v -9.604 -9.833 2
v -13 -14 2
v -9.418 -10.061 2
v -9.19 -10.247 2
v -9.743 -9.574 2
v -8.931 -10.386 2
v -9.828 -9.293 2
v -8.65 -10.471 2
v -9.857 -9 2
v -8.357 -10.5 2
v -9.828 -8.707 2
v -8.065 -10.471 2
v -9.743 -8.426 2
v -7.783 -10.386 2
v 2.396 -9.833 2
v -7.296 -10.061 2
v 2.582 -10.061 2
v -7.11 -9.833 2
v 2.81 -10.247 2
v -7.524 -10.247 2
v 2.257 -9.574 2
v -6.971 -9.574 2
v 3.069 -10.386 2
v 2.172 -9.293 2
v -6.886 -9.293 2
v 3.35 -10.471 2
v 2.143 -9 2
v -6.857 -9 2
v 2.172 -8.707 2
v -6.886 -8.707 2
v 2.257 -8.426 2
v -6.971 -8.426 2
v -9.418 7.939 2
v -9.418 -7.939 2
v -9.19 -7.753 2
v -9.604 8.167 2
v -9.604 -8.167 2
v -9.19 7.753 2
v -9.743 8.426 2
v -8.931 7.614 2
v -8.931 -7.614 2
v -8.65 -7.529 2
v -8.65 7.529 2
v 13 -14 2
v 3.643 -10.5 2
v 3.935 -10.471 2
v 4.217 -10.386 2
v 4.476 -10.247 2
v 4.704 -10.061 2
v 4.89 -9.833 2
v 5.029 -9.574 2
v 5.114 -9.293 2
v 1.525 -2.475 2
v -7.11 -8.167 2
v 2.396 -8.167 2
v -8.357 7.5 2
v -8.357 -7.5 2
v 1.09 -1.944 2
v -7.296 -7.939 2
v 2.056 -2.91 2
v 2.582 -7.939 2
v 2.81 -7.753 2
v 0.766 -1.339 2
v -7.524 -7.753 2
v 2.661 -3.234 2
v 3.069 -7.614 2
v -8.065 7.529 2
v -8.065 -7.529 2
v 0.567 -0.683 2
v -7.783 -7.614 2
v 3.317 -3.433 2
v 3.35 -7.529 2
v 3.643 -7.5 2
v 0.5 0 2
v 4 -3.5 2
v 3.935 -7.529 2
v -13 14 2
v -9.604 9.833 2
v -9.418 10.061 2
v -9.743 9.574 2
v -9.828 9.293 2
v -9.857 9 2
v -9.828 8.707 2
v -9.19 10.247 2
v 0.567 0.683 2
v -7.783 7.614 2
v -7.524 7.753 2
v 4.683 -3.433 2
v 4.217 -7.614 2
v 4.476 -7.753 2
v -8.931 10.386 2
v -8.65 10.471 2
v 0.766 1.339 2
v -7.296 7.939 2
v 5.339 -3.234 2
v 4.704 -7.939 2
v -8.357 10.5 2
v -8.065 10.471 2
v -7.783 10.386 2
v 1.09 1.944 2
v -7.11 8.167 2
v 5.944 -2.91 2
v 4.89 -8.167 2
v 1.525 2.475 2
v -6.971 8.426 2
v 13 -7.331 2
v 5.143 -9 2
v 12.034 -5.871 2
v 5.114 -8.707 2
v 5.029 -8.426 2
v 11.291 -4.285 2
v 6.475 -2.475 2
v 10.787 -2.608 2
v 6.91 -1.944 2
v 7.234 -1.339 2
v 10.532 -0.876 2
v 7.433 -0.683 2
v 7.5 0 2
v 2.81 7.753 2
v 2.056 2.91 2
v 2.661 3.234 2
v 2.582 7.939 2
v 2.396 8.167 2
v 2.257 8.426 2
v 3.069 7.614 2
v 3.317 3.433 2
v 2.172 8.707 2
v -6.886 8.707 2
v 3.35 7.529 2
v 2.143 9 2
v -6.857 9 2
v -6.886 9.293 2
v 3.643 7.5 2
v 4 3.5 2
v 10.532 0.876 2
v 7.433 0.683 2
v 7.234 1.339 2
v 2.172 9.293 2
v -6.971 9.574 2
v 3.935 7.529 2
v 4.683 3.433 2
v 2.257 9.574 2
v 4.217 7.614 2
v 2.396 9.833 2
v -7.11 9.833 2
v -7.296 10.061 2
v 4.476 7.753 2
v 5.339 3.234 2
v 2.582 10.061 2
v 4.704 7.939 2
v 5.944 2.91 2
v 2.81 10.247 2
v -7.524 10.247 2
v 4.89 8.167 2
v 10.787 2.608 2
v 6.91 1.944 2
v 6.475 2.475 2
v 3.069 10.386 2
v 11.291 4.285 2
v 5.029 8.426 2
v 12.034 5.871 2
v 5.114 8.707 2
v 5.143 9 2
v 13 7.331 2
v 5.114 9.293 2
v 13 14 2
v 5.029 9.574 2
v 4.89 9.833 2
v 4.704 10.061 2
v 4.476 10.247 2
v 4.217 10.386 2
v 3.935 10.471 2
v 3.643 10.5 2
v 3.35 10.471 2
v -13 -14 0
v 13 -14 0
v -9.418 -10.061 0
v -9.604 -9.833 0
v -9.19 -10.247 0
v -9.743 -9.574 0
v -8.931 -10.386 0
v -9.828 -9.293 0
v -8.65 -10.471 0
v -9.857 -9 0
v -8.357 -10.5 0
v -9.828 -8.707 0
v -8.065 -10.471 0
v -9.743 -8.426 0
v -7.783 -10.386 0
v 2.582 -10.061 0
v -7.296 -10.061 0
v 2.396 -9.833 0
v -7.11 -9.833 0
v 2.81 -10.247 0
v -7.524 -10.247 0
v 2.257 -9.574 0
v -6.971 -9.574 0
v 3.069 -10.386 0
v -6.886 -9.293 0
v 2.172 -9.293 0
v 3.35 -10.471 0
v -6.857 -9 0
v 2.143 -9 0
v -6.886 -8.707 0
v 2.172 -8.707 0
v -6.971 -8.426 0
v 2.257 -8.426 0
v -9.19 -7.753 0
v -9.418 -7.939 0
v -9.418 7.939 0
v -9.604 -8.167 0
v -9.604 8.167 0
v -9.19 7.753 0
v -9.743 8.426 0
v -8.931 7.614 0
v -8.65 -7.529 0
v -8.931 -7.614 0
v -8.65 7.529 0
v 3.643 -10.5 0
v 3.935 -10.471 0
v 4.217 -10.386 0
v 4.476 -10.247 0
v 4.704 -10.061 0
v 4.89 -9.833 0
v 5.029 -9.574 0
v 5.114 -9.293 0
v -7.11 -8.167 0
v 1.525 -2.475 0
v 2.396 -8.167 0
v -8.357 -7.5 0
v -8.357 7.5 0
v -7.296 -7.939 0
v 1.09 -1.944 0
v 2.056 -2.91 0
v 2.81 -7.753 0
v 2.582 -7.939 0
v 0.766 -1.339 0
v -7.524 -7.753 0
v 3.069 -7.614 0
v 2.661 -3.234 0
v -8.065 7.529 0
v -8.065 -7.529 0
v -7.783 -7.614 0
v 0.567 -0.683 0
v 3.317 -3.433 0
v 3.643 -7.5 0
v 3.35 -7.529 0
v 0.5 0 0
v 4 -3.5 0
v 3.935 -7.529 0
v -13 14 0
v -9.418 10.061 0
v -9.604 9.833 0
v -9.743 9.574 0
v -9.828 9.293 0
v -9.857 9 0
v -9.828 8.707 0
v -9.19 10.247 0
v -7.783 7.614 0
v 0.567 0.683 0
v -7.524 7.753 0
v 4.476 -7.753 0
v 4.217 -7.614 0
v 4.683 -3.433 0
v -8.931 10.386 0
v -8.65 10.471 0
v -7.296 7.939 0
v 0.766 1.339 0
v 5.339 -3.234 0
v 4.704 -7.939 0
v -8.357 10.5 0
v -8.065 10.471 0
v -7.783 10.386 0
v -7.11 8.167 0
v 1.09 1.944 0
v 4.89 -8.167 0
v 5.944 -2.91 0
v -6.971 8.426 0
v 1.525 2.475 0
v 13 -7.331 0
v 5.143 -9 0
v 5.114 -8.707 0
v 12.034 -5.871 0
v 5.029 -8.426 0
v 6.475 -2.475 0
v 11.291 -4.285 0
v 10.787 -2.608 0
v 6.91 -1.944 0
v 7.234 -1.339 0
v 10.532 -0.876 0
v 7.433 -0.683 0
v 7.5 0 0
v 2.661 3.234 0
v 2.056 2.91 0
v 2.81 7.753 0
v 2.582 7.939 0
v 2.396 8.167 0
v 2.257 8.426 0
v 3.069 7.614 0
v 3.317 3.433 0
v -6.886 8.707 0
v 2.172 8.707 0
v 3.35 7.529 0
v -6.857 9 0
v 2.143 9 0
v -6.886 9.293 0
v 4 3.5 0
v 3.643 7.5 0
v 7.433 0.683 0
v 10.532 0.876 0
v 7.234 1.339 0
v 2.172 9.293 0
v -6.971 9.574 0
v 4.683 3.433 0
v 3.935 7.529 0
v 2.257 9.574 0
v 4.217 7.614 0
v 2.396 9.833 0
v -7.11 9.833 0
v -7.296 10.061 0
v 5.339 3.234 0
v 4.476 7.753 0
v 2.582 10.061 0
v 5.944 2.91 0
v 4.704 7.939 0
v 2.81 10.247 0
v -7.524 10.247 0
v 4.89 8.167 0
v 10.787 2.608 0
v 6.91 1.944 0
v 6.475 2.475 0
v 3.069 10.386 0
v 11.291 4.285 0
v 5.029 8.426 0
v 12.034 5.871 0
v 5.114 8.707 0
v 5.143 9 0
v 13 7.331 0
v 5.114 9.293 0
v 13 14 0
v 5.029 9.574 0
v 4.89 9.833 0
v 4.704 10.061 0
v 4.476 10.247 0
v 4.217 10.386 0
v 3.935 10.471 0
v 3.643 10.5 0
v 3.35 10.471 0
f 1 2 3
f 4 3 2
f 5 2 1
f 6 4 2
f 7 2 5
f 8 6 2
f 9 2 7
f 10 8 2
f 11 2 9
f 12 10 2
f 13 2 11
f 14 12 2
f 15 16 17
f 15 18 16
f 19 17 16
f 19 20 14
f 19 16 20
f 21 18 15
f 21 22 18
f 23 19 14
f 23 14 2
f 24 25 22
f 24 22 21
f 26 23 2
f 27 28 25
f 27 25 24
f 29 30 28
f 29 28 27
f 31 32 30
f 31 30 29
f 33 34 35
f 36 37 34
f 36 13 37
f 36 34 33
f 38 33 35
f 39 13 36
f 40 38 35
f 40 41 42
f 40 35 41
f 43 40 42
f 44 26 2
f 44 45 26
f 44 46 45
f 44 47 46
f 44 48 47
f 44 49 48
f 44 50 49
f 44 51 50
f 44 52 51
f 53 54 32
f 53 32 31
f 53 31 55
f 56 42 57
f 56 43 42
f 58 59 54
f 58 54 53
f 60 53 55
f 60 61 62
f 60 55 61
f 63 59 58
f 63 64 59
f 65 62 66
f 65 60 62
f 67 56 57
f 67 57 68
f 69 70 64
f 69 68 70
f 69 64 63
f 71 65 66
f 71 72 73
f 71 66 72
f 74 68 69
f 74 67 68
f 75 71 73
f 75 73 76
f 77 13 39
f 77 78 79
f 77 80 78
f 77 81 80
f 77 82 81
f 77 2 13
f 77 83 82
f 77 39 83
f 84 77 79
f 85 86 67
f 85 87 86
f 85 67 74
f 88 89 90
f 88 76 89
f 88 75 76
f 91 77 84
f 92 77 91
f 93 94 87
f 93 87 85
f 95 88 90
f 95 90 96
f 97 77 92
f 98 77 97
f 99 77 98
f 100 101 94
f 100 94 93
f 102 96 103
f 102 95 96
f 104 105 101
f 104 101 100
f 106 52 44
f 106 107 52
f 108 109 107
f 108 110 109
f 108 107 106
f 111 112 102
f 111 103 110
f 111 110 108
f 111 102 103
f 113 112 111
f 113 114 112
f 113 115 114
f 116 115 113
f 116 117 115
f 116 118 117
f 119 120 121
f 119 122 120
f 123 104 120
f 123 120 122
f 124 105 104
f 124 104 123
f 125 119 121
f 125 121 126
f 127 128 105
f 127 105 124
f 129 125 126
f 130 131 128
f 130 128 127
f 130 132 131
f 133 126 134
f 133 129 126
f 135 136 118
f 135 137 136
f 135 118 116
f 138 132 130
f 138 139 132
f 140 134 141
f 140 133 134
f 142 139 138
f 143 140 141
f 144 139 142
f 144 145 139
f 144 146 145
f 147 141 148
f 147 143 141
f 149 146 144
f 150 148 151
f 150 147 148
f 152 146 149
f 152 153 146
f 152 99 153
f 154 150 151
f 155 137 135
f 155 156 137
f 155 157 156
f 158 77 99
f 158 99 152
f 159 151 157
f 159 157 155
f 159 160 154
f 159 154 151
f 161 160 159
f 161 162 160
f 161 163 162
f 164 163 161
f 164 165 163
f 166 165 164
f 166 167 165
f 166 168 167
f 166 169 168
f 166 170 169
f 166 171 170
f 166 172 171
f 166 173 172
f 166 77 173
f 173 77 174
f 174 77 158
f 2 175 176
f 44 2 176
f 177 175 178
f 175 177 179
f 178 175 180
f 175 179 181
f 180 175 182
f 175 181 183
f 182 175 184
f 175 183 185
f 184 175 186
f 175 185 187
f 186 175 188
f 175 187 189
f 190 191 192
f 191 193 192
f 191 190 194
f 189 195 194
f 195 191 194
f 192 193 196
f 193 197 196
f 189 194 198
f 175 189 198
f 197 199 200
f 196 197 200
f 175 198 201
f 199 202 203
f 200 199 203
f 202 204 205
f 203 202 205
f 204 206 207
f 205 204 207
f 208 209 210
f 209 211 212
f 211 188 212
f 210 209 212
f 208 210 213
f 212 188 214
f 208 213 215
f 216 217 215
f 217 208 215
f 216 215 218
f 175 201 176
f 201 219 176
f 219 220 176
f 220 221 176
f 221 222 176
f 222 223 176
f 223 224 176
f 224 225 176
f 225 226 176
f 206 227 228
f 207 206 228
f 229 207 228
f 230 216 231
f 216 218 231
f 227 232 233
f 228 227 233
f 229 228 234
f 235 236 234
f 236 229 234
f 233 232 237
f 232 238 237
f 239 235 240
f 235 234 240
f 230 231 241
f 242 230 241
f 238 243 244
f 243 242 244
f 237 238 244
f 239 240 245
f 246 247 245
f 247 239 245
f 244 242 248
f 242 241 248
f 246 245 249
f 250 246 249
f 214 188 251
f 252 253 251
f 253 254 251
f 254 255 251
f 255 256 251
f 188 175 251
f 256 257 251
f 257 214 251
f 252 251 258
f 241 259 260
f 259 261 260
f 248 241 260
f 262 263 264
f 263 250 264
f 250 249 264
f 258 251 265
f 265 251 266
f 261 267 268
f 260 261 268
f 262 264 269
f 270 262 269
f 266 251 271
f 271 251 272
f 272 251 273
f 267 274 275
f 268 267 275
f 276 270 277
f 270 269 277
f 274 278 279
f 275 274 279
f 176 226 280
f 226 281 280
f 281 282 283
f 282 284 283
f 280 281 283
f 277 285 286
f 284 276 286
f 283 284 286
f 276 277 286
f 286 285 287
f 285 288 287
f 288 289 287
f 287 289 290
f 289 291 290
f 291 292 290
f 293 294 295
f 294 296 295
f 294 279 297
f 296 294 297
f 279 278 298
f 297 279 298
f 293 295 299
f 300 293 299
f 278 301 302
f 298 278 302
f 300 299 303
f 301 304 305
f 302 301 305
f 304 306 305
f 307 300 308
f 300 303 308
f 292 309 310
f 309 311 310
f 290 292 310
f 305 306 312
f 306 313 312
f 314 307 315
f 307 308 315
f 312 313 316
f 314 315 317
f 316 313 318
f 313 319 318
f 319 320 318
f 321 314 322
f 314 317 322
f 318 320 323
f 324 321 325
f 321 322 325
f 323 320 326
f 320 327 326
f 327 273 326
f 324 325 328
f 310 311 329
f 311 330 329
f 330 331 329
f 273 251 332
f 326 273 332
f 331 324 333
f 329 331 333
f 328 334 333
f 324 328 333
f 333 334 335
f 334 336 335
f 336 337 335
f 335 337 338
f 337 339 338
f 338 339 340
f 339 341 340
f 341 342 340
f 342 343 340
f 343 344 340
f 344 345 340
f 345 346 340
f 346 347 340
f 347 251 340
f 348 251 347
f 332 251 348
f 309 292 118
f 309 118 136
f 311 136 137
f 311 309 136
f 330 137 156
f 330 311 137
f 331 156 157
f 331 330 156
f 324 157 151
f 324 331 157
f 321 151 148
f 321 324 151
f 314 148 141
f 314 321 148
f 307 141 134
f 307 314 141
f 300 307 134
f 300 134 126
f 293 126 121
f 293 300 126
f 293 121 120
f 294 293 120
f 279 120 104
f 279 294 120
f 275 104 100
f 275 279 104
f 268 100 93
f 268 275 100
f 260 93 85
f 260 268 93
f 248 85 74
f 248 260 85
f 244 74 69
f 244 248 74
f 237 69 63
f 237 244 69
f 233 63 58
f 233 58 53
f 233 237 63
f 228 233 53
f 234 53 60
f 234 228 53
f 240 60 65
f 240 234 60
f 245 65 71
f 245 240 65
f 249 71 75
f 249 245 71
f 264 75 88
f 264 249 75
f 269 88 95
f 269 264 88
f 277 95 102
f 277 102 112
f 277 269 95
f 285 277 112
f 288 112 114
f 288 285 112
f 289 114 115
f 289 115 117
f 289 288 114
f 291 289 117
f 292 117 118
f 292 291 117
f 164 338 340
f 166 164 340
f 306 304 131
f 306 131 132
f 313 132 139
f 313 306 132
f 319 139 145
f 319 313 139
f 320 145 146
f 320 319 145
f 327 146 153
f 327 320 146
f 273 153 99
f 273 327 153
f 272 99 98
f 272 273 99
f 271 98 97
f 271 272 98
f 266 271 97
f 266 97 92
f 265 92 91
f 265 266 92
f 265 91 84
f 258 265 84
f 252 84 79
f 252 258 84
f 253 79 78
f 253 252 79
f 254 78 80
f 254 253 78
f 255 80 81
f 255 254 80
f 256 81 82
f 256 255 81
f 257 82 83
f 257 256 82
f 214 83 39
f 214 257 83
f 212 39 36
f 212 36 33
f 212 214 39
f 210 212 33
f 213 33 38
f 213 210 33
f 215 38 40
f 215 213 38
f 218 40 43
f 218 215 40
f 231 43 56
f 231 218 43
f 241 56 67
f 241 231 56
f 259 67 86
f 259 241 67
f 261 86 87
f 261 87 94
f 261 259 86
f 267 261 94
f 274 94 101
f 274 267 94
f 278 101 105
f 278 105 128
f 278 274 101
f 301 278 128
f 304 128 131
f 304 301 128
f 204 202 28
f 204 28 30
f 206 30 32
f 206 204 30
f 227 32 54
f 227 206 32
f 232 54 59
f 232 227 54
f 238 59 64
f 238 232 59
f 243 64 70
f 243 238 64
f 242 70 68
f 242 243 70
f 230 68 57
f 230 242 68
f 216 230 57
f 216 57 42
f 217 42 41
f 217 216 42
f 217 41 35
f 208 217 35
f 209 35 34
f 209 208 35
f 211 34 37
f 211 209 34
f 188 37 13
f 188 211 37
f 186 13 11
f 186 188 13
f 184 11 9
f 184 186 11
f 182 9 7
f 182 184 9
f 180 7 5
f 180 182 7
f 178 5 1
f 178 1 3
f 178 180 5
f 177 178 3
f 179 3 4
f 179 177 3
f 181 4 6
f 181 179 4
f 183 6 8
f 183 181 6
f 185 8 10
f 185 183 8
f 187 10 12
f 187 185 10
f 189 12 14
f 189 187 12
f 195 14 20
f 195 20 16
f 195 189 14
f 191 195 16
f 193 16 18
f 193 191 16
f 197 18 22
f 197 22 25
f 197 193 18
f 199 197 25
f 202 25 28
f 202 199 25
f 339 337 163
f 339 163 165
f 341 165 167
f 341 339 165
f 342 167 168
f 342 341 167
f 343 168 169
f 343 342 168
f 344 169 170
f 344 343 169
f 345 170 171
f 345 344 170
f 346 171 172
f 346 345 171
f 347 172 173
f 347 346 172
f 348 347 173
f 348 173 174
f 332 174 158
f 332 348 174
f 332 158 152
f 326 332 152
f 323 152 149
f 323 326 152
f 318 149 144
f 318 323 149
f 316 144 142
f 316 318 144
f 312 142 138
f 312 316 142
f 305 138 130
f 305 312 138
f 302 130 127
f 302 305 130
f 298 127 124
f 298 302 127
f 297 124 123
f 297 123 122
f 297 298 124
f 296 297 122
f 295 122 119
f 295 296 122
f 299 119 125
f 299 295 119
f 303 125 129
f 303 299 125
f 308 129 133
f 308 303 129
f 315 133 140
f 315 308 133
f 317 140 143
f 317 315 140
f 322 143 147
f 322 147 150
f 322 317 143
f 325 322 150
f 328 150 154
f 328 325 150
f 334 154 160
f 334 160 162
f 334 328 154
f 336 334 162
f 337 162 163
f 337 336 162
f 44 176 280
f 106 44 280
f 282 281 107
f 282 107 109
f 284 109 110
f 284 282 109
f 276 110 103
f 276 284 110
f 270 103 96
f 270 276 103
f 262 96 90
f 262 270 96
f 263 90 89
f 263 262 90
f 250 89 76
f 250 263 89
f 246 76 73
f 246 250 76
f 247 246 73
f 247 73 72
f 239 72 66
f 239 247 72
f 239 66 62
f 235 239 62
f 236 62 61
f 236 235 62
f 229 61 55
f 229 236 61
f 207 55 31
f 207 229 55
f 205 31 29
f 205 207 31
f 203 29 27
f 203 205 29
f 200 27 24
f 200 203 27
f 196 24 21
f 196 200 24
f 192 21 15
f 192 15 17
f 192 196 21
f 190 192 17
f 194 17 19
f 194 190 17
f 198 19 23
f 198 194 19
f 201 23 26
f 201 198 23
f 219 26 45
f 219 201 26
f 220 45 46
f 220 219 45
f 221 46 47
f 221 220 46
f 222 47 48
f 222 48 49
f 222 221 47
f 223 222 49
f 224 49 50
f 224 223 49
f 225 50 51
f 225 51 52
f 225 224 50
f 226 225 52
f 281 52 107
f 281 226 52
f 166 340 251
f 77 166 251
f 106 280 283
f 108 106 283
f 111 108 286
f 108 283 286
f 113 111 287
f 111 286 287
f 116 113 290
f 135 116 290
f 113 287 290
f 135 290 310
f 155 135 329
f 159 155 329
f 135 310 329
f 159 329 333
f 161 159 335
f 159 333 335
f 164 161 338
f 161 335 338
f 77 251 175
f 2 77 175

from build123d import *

# Parameters (mm, degrees)
SKETCH1_R           = 1.5
SKETCH1_R_2         = 3.5
BOSS_EXTRUDE1_DEPTH = 2


with BuildPart() as part:
    # Sketch1 → Boss-Extrude1 (new body)
    with BuildSketch(Plane.XY):
        with BuildLine():
            Line((-13, -14), (13, -14))
            Line((13, -14), (13, -7.331439149))
            ThreePointArc((13, -7.331439149), (10.5, 0), (13, 7.331439149))
            Line((13, 7.331439149), (13, 14))
            Line((13, 14), (-13, 14))
            Line((-13, 14), (-13, -14))
        make_face()
        with Locations((-8.357142857, 9)):
            Circle(SKETCH1_R, mode=Mode.SUBTRACT)
        with Locations((4, 0)):
            Circle(SKETCH1_R_2, mode=Mode.SUBTRACT)
        with Locations((3.642857143, 9)):
            Circle(SKETCH1_R, mode=Mode.SUBTRACT)
        with Locations((3.642857143, -9)):
            Circle(SKETCH1_R, mode=Mode.SUBTRACT)
        with Locations((-8.357142857, -9)):
            Circle(SKETCH1_R, mode=Mode.SUBTRACT)
    extrude(amount=BOSS_EXTRUDE1_DEPTH)


solid = part.part
